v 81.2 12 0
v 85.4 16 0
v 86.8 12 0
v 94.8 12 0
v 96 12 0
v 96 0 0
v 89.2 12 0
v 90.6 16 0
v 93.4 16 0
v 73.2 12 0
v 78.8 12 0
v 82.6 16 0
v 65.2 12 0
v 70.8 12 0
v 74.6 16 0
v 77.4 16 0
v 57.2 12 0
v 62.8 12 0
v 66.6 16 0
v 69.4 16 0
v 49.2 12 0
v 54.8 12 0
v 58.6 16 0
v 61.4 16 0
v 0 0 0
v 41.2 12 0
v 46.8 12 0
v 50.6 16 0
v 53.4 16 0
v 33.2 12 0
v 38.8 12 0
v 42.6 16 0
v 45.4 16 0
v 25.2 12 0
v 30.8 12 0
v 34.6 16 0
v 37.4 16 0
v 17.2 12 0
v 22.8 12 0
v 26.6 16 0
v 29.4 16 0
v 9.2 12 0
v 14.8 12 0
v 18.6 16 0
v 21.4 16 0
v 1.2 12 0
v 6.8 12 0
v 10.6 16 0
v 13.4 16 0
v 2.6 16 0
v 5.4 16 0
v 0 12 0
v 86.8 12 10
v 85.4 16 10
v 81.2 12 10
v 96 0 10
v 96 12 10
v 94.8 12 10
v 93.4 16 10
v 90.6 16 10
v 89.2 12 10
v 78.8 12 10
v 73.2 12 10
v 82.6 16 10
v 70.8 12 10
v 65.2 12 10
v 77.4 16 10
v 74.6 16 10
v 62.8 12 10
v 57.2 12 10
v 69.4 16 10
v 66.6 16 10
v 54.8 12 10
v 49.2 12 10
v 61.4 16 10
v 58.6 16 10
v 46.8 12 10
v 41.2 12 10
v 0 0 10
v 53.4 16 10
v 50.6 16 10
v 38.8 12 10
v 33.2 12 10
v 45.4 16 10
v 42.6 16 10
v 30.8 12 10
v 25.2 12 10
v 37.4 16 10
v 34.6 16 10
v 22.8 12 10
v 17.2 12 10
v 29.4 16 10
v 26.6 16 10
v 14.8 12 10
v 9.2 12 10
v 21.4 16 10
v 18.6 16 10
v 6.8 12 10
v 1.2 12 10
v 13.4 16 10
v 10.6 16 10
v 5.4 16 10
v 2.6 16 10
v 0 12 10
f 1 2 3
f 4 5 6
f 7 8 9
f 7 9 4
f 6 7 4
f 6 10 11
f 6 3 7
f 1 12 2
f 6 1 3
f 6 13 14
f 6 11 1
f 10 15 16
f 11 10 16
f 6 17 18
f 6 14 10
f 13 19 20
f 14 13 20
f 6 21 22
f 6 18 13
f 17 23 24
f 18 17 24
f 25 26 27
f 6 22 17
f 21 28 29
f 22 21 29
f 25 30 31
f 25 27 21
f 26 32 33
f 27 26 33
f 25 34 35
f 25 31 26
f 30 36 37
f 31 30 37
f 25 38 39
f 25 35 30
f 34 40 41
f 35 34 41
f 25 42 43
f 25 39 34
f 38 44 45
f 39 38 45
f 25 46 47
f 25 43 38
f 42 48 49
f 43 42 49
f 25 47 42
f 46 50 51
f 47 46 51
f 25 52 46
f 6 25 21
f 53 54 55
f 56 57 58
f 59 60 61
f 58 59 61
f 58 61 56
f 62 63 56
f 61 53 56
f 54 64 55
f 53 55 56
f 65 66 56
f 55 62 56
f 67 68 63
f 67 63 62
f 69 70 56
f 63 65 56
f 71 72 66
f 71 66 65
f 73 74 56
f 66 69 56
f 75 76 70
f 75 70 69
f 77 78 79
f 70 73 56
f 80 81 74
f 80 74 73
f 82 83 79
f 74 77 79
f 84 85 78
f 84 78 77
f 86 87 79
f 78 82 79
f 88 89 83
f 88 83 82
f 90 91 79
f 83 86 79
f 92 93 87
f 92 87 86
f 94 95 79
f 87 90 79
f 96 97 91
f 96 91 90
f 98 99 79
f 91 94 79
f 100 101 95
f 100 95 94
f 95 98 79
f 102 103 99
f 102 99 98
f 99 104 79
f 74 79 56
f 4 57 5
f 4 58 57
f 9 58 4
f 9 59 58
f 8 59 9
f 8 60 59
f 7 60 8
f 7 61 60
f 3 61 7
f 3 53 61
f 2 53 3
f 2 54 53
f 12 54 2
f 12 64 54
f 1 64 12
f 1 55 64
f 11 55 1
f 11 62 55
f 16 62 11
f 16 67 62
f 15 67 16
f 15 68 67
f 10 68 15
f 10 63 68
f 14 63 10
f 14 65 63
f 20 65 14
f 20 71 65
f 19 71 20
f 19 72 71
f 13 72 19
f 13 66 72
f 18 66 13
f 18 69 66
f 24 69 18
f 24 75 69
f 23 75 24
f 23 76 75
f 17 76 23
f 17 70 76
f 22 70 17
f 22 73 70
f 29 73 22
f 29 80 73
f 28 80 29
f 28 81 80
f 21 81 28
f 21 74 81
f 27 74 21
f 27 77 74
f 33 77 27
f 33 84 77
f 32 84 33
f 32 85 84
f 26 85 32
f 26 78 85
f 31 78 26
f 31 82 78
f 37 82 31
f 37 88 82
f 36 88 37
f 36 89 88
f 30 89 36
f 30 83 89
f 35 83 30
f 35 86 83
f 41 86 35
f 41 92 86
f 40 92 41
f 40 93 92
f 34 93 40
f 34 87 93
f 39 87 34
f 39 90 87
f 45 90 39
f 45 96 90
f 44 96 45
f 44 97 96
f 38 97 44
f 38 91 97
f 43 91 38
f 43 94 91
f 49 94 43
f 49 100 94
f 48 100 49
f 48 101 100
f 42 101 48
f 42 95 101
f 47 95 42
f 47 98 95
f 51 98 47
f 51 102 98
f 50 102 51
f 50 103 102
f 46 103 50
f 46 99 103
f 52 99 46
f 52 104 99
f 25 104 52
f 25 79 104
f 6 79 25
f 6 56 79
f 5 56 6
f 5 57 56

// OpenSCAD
$fn = 32;

// ----------------------------------------------------------------------
// Gear rack: 12 teeth, pitch 8 mm
// ----------------------------------------------------------------------

// --- parameters (mm) ---
teeth = 12;               // number of teeth
pitch = 8;                // tooth pitch, X
root_w = 5.6;             // tooth width at the root
tip_w = 2.8;              // tooth width at the tip
base_h = 12;              // rack body height, Y
tooth_h = 4;              // tooth height above the body
plate_t = 10;             // rack width, Z (extrusion height)

rack_l = teeth * pitch;  // overall length
total_h = base_h + tooth_h;  // overall height

profile = [[0, 0], [96, 0], [96, 12], [94.8, 12], [93.4, 16], [90.6, 16], [89.2, 12], [86.8, 12], [85.4, 16], [82.6, 16], [81.2, 12], [78.8, 12], [77.4, 16], [74.6, 16], [73.2, 12], [70.8, 12], [69.4, 16], [66.6, 16], [65.2, 12], [62.8, 12], [61.4, 16], [58.6, 16], [57.2, 12], [54.8, 12], [53.4, 16], [50.6, 16], [49.2, 12], [46.8, 12], [45.4, 16], [42.6, 16], [41.2, 12], [38.8, 12], [37.4, 16], [34.6, 16], [33.2, 12], [30.8, 12], [29.4, 16], [26.6, 16], [25.2, 12], [22.8, 12], [21.4, 16], [18.6, 16], [17.2, 12], [14.8, 12], [13.4, 16], [10.6, 16], [9.2, 12], [6.8, 12], [5.4, 16], [2.6, 16], [1.2, 12], [0, 12]];  // primary outline, 52 points, counter clockwise

// --- the one profile operation ---
linear_extrude(height = plate_t) polygon(points = profile);
